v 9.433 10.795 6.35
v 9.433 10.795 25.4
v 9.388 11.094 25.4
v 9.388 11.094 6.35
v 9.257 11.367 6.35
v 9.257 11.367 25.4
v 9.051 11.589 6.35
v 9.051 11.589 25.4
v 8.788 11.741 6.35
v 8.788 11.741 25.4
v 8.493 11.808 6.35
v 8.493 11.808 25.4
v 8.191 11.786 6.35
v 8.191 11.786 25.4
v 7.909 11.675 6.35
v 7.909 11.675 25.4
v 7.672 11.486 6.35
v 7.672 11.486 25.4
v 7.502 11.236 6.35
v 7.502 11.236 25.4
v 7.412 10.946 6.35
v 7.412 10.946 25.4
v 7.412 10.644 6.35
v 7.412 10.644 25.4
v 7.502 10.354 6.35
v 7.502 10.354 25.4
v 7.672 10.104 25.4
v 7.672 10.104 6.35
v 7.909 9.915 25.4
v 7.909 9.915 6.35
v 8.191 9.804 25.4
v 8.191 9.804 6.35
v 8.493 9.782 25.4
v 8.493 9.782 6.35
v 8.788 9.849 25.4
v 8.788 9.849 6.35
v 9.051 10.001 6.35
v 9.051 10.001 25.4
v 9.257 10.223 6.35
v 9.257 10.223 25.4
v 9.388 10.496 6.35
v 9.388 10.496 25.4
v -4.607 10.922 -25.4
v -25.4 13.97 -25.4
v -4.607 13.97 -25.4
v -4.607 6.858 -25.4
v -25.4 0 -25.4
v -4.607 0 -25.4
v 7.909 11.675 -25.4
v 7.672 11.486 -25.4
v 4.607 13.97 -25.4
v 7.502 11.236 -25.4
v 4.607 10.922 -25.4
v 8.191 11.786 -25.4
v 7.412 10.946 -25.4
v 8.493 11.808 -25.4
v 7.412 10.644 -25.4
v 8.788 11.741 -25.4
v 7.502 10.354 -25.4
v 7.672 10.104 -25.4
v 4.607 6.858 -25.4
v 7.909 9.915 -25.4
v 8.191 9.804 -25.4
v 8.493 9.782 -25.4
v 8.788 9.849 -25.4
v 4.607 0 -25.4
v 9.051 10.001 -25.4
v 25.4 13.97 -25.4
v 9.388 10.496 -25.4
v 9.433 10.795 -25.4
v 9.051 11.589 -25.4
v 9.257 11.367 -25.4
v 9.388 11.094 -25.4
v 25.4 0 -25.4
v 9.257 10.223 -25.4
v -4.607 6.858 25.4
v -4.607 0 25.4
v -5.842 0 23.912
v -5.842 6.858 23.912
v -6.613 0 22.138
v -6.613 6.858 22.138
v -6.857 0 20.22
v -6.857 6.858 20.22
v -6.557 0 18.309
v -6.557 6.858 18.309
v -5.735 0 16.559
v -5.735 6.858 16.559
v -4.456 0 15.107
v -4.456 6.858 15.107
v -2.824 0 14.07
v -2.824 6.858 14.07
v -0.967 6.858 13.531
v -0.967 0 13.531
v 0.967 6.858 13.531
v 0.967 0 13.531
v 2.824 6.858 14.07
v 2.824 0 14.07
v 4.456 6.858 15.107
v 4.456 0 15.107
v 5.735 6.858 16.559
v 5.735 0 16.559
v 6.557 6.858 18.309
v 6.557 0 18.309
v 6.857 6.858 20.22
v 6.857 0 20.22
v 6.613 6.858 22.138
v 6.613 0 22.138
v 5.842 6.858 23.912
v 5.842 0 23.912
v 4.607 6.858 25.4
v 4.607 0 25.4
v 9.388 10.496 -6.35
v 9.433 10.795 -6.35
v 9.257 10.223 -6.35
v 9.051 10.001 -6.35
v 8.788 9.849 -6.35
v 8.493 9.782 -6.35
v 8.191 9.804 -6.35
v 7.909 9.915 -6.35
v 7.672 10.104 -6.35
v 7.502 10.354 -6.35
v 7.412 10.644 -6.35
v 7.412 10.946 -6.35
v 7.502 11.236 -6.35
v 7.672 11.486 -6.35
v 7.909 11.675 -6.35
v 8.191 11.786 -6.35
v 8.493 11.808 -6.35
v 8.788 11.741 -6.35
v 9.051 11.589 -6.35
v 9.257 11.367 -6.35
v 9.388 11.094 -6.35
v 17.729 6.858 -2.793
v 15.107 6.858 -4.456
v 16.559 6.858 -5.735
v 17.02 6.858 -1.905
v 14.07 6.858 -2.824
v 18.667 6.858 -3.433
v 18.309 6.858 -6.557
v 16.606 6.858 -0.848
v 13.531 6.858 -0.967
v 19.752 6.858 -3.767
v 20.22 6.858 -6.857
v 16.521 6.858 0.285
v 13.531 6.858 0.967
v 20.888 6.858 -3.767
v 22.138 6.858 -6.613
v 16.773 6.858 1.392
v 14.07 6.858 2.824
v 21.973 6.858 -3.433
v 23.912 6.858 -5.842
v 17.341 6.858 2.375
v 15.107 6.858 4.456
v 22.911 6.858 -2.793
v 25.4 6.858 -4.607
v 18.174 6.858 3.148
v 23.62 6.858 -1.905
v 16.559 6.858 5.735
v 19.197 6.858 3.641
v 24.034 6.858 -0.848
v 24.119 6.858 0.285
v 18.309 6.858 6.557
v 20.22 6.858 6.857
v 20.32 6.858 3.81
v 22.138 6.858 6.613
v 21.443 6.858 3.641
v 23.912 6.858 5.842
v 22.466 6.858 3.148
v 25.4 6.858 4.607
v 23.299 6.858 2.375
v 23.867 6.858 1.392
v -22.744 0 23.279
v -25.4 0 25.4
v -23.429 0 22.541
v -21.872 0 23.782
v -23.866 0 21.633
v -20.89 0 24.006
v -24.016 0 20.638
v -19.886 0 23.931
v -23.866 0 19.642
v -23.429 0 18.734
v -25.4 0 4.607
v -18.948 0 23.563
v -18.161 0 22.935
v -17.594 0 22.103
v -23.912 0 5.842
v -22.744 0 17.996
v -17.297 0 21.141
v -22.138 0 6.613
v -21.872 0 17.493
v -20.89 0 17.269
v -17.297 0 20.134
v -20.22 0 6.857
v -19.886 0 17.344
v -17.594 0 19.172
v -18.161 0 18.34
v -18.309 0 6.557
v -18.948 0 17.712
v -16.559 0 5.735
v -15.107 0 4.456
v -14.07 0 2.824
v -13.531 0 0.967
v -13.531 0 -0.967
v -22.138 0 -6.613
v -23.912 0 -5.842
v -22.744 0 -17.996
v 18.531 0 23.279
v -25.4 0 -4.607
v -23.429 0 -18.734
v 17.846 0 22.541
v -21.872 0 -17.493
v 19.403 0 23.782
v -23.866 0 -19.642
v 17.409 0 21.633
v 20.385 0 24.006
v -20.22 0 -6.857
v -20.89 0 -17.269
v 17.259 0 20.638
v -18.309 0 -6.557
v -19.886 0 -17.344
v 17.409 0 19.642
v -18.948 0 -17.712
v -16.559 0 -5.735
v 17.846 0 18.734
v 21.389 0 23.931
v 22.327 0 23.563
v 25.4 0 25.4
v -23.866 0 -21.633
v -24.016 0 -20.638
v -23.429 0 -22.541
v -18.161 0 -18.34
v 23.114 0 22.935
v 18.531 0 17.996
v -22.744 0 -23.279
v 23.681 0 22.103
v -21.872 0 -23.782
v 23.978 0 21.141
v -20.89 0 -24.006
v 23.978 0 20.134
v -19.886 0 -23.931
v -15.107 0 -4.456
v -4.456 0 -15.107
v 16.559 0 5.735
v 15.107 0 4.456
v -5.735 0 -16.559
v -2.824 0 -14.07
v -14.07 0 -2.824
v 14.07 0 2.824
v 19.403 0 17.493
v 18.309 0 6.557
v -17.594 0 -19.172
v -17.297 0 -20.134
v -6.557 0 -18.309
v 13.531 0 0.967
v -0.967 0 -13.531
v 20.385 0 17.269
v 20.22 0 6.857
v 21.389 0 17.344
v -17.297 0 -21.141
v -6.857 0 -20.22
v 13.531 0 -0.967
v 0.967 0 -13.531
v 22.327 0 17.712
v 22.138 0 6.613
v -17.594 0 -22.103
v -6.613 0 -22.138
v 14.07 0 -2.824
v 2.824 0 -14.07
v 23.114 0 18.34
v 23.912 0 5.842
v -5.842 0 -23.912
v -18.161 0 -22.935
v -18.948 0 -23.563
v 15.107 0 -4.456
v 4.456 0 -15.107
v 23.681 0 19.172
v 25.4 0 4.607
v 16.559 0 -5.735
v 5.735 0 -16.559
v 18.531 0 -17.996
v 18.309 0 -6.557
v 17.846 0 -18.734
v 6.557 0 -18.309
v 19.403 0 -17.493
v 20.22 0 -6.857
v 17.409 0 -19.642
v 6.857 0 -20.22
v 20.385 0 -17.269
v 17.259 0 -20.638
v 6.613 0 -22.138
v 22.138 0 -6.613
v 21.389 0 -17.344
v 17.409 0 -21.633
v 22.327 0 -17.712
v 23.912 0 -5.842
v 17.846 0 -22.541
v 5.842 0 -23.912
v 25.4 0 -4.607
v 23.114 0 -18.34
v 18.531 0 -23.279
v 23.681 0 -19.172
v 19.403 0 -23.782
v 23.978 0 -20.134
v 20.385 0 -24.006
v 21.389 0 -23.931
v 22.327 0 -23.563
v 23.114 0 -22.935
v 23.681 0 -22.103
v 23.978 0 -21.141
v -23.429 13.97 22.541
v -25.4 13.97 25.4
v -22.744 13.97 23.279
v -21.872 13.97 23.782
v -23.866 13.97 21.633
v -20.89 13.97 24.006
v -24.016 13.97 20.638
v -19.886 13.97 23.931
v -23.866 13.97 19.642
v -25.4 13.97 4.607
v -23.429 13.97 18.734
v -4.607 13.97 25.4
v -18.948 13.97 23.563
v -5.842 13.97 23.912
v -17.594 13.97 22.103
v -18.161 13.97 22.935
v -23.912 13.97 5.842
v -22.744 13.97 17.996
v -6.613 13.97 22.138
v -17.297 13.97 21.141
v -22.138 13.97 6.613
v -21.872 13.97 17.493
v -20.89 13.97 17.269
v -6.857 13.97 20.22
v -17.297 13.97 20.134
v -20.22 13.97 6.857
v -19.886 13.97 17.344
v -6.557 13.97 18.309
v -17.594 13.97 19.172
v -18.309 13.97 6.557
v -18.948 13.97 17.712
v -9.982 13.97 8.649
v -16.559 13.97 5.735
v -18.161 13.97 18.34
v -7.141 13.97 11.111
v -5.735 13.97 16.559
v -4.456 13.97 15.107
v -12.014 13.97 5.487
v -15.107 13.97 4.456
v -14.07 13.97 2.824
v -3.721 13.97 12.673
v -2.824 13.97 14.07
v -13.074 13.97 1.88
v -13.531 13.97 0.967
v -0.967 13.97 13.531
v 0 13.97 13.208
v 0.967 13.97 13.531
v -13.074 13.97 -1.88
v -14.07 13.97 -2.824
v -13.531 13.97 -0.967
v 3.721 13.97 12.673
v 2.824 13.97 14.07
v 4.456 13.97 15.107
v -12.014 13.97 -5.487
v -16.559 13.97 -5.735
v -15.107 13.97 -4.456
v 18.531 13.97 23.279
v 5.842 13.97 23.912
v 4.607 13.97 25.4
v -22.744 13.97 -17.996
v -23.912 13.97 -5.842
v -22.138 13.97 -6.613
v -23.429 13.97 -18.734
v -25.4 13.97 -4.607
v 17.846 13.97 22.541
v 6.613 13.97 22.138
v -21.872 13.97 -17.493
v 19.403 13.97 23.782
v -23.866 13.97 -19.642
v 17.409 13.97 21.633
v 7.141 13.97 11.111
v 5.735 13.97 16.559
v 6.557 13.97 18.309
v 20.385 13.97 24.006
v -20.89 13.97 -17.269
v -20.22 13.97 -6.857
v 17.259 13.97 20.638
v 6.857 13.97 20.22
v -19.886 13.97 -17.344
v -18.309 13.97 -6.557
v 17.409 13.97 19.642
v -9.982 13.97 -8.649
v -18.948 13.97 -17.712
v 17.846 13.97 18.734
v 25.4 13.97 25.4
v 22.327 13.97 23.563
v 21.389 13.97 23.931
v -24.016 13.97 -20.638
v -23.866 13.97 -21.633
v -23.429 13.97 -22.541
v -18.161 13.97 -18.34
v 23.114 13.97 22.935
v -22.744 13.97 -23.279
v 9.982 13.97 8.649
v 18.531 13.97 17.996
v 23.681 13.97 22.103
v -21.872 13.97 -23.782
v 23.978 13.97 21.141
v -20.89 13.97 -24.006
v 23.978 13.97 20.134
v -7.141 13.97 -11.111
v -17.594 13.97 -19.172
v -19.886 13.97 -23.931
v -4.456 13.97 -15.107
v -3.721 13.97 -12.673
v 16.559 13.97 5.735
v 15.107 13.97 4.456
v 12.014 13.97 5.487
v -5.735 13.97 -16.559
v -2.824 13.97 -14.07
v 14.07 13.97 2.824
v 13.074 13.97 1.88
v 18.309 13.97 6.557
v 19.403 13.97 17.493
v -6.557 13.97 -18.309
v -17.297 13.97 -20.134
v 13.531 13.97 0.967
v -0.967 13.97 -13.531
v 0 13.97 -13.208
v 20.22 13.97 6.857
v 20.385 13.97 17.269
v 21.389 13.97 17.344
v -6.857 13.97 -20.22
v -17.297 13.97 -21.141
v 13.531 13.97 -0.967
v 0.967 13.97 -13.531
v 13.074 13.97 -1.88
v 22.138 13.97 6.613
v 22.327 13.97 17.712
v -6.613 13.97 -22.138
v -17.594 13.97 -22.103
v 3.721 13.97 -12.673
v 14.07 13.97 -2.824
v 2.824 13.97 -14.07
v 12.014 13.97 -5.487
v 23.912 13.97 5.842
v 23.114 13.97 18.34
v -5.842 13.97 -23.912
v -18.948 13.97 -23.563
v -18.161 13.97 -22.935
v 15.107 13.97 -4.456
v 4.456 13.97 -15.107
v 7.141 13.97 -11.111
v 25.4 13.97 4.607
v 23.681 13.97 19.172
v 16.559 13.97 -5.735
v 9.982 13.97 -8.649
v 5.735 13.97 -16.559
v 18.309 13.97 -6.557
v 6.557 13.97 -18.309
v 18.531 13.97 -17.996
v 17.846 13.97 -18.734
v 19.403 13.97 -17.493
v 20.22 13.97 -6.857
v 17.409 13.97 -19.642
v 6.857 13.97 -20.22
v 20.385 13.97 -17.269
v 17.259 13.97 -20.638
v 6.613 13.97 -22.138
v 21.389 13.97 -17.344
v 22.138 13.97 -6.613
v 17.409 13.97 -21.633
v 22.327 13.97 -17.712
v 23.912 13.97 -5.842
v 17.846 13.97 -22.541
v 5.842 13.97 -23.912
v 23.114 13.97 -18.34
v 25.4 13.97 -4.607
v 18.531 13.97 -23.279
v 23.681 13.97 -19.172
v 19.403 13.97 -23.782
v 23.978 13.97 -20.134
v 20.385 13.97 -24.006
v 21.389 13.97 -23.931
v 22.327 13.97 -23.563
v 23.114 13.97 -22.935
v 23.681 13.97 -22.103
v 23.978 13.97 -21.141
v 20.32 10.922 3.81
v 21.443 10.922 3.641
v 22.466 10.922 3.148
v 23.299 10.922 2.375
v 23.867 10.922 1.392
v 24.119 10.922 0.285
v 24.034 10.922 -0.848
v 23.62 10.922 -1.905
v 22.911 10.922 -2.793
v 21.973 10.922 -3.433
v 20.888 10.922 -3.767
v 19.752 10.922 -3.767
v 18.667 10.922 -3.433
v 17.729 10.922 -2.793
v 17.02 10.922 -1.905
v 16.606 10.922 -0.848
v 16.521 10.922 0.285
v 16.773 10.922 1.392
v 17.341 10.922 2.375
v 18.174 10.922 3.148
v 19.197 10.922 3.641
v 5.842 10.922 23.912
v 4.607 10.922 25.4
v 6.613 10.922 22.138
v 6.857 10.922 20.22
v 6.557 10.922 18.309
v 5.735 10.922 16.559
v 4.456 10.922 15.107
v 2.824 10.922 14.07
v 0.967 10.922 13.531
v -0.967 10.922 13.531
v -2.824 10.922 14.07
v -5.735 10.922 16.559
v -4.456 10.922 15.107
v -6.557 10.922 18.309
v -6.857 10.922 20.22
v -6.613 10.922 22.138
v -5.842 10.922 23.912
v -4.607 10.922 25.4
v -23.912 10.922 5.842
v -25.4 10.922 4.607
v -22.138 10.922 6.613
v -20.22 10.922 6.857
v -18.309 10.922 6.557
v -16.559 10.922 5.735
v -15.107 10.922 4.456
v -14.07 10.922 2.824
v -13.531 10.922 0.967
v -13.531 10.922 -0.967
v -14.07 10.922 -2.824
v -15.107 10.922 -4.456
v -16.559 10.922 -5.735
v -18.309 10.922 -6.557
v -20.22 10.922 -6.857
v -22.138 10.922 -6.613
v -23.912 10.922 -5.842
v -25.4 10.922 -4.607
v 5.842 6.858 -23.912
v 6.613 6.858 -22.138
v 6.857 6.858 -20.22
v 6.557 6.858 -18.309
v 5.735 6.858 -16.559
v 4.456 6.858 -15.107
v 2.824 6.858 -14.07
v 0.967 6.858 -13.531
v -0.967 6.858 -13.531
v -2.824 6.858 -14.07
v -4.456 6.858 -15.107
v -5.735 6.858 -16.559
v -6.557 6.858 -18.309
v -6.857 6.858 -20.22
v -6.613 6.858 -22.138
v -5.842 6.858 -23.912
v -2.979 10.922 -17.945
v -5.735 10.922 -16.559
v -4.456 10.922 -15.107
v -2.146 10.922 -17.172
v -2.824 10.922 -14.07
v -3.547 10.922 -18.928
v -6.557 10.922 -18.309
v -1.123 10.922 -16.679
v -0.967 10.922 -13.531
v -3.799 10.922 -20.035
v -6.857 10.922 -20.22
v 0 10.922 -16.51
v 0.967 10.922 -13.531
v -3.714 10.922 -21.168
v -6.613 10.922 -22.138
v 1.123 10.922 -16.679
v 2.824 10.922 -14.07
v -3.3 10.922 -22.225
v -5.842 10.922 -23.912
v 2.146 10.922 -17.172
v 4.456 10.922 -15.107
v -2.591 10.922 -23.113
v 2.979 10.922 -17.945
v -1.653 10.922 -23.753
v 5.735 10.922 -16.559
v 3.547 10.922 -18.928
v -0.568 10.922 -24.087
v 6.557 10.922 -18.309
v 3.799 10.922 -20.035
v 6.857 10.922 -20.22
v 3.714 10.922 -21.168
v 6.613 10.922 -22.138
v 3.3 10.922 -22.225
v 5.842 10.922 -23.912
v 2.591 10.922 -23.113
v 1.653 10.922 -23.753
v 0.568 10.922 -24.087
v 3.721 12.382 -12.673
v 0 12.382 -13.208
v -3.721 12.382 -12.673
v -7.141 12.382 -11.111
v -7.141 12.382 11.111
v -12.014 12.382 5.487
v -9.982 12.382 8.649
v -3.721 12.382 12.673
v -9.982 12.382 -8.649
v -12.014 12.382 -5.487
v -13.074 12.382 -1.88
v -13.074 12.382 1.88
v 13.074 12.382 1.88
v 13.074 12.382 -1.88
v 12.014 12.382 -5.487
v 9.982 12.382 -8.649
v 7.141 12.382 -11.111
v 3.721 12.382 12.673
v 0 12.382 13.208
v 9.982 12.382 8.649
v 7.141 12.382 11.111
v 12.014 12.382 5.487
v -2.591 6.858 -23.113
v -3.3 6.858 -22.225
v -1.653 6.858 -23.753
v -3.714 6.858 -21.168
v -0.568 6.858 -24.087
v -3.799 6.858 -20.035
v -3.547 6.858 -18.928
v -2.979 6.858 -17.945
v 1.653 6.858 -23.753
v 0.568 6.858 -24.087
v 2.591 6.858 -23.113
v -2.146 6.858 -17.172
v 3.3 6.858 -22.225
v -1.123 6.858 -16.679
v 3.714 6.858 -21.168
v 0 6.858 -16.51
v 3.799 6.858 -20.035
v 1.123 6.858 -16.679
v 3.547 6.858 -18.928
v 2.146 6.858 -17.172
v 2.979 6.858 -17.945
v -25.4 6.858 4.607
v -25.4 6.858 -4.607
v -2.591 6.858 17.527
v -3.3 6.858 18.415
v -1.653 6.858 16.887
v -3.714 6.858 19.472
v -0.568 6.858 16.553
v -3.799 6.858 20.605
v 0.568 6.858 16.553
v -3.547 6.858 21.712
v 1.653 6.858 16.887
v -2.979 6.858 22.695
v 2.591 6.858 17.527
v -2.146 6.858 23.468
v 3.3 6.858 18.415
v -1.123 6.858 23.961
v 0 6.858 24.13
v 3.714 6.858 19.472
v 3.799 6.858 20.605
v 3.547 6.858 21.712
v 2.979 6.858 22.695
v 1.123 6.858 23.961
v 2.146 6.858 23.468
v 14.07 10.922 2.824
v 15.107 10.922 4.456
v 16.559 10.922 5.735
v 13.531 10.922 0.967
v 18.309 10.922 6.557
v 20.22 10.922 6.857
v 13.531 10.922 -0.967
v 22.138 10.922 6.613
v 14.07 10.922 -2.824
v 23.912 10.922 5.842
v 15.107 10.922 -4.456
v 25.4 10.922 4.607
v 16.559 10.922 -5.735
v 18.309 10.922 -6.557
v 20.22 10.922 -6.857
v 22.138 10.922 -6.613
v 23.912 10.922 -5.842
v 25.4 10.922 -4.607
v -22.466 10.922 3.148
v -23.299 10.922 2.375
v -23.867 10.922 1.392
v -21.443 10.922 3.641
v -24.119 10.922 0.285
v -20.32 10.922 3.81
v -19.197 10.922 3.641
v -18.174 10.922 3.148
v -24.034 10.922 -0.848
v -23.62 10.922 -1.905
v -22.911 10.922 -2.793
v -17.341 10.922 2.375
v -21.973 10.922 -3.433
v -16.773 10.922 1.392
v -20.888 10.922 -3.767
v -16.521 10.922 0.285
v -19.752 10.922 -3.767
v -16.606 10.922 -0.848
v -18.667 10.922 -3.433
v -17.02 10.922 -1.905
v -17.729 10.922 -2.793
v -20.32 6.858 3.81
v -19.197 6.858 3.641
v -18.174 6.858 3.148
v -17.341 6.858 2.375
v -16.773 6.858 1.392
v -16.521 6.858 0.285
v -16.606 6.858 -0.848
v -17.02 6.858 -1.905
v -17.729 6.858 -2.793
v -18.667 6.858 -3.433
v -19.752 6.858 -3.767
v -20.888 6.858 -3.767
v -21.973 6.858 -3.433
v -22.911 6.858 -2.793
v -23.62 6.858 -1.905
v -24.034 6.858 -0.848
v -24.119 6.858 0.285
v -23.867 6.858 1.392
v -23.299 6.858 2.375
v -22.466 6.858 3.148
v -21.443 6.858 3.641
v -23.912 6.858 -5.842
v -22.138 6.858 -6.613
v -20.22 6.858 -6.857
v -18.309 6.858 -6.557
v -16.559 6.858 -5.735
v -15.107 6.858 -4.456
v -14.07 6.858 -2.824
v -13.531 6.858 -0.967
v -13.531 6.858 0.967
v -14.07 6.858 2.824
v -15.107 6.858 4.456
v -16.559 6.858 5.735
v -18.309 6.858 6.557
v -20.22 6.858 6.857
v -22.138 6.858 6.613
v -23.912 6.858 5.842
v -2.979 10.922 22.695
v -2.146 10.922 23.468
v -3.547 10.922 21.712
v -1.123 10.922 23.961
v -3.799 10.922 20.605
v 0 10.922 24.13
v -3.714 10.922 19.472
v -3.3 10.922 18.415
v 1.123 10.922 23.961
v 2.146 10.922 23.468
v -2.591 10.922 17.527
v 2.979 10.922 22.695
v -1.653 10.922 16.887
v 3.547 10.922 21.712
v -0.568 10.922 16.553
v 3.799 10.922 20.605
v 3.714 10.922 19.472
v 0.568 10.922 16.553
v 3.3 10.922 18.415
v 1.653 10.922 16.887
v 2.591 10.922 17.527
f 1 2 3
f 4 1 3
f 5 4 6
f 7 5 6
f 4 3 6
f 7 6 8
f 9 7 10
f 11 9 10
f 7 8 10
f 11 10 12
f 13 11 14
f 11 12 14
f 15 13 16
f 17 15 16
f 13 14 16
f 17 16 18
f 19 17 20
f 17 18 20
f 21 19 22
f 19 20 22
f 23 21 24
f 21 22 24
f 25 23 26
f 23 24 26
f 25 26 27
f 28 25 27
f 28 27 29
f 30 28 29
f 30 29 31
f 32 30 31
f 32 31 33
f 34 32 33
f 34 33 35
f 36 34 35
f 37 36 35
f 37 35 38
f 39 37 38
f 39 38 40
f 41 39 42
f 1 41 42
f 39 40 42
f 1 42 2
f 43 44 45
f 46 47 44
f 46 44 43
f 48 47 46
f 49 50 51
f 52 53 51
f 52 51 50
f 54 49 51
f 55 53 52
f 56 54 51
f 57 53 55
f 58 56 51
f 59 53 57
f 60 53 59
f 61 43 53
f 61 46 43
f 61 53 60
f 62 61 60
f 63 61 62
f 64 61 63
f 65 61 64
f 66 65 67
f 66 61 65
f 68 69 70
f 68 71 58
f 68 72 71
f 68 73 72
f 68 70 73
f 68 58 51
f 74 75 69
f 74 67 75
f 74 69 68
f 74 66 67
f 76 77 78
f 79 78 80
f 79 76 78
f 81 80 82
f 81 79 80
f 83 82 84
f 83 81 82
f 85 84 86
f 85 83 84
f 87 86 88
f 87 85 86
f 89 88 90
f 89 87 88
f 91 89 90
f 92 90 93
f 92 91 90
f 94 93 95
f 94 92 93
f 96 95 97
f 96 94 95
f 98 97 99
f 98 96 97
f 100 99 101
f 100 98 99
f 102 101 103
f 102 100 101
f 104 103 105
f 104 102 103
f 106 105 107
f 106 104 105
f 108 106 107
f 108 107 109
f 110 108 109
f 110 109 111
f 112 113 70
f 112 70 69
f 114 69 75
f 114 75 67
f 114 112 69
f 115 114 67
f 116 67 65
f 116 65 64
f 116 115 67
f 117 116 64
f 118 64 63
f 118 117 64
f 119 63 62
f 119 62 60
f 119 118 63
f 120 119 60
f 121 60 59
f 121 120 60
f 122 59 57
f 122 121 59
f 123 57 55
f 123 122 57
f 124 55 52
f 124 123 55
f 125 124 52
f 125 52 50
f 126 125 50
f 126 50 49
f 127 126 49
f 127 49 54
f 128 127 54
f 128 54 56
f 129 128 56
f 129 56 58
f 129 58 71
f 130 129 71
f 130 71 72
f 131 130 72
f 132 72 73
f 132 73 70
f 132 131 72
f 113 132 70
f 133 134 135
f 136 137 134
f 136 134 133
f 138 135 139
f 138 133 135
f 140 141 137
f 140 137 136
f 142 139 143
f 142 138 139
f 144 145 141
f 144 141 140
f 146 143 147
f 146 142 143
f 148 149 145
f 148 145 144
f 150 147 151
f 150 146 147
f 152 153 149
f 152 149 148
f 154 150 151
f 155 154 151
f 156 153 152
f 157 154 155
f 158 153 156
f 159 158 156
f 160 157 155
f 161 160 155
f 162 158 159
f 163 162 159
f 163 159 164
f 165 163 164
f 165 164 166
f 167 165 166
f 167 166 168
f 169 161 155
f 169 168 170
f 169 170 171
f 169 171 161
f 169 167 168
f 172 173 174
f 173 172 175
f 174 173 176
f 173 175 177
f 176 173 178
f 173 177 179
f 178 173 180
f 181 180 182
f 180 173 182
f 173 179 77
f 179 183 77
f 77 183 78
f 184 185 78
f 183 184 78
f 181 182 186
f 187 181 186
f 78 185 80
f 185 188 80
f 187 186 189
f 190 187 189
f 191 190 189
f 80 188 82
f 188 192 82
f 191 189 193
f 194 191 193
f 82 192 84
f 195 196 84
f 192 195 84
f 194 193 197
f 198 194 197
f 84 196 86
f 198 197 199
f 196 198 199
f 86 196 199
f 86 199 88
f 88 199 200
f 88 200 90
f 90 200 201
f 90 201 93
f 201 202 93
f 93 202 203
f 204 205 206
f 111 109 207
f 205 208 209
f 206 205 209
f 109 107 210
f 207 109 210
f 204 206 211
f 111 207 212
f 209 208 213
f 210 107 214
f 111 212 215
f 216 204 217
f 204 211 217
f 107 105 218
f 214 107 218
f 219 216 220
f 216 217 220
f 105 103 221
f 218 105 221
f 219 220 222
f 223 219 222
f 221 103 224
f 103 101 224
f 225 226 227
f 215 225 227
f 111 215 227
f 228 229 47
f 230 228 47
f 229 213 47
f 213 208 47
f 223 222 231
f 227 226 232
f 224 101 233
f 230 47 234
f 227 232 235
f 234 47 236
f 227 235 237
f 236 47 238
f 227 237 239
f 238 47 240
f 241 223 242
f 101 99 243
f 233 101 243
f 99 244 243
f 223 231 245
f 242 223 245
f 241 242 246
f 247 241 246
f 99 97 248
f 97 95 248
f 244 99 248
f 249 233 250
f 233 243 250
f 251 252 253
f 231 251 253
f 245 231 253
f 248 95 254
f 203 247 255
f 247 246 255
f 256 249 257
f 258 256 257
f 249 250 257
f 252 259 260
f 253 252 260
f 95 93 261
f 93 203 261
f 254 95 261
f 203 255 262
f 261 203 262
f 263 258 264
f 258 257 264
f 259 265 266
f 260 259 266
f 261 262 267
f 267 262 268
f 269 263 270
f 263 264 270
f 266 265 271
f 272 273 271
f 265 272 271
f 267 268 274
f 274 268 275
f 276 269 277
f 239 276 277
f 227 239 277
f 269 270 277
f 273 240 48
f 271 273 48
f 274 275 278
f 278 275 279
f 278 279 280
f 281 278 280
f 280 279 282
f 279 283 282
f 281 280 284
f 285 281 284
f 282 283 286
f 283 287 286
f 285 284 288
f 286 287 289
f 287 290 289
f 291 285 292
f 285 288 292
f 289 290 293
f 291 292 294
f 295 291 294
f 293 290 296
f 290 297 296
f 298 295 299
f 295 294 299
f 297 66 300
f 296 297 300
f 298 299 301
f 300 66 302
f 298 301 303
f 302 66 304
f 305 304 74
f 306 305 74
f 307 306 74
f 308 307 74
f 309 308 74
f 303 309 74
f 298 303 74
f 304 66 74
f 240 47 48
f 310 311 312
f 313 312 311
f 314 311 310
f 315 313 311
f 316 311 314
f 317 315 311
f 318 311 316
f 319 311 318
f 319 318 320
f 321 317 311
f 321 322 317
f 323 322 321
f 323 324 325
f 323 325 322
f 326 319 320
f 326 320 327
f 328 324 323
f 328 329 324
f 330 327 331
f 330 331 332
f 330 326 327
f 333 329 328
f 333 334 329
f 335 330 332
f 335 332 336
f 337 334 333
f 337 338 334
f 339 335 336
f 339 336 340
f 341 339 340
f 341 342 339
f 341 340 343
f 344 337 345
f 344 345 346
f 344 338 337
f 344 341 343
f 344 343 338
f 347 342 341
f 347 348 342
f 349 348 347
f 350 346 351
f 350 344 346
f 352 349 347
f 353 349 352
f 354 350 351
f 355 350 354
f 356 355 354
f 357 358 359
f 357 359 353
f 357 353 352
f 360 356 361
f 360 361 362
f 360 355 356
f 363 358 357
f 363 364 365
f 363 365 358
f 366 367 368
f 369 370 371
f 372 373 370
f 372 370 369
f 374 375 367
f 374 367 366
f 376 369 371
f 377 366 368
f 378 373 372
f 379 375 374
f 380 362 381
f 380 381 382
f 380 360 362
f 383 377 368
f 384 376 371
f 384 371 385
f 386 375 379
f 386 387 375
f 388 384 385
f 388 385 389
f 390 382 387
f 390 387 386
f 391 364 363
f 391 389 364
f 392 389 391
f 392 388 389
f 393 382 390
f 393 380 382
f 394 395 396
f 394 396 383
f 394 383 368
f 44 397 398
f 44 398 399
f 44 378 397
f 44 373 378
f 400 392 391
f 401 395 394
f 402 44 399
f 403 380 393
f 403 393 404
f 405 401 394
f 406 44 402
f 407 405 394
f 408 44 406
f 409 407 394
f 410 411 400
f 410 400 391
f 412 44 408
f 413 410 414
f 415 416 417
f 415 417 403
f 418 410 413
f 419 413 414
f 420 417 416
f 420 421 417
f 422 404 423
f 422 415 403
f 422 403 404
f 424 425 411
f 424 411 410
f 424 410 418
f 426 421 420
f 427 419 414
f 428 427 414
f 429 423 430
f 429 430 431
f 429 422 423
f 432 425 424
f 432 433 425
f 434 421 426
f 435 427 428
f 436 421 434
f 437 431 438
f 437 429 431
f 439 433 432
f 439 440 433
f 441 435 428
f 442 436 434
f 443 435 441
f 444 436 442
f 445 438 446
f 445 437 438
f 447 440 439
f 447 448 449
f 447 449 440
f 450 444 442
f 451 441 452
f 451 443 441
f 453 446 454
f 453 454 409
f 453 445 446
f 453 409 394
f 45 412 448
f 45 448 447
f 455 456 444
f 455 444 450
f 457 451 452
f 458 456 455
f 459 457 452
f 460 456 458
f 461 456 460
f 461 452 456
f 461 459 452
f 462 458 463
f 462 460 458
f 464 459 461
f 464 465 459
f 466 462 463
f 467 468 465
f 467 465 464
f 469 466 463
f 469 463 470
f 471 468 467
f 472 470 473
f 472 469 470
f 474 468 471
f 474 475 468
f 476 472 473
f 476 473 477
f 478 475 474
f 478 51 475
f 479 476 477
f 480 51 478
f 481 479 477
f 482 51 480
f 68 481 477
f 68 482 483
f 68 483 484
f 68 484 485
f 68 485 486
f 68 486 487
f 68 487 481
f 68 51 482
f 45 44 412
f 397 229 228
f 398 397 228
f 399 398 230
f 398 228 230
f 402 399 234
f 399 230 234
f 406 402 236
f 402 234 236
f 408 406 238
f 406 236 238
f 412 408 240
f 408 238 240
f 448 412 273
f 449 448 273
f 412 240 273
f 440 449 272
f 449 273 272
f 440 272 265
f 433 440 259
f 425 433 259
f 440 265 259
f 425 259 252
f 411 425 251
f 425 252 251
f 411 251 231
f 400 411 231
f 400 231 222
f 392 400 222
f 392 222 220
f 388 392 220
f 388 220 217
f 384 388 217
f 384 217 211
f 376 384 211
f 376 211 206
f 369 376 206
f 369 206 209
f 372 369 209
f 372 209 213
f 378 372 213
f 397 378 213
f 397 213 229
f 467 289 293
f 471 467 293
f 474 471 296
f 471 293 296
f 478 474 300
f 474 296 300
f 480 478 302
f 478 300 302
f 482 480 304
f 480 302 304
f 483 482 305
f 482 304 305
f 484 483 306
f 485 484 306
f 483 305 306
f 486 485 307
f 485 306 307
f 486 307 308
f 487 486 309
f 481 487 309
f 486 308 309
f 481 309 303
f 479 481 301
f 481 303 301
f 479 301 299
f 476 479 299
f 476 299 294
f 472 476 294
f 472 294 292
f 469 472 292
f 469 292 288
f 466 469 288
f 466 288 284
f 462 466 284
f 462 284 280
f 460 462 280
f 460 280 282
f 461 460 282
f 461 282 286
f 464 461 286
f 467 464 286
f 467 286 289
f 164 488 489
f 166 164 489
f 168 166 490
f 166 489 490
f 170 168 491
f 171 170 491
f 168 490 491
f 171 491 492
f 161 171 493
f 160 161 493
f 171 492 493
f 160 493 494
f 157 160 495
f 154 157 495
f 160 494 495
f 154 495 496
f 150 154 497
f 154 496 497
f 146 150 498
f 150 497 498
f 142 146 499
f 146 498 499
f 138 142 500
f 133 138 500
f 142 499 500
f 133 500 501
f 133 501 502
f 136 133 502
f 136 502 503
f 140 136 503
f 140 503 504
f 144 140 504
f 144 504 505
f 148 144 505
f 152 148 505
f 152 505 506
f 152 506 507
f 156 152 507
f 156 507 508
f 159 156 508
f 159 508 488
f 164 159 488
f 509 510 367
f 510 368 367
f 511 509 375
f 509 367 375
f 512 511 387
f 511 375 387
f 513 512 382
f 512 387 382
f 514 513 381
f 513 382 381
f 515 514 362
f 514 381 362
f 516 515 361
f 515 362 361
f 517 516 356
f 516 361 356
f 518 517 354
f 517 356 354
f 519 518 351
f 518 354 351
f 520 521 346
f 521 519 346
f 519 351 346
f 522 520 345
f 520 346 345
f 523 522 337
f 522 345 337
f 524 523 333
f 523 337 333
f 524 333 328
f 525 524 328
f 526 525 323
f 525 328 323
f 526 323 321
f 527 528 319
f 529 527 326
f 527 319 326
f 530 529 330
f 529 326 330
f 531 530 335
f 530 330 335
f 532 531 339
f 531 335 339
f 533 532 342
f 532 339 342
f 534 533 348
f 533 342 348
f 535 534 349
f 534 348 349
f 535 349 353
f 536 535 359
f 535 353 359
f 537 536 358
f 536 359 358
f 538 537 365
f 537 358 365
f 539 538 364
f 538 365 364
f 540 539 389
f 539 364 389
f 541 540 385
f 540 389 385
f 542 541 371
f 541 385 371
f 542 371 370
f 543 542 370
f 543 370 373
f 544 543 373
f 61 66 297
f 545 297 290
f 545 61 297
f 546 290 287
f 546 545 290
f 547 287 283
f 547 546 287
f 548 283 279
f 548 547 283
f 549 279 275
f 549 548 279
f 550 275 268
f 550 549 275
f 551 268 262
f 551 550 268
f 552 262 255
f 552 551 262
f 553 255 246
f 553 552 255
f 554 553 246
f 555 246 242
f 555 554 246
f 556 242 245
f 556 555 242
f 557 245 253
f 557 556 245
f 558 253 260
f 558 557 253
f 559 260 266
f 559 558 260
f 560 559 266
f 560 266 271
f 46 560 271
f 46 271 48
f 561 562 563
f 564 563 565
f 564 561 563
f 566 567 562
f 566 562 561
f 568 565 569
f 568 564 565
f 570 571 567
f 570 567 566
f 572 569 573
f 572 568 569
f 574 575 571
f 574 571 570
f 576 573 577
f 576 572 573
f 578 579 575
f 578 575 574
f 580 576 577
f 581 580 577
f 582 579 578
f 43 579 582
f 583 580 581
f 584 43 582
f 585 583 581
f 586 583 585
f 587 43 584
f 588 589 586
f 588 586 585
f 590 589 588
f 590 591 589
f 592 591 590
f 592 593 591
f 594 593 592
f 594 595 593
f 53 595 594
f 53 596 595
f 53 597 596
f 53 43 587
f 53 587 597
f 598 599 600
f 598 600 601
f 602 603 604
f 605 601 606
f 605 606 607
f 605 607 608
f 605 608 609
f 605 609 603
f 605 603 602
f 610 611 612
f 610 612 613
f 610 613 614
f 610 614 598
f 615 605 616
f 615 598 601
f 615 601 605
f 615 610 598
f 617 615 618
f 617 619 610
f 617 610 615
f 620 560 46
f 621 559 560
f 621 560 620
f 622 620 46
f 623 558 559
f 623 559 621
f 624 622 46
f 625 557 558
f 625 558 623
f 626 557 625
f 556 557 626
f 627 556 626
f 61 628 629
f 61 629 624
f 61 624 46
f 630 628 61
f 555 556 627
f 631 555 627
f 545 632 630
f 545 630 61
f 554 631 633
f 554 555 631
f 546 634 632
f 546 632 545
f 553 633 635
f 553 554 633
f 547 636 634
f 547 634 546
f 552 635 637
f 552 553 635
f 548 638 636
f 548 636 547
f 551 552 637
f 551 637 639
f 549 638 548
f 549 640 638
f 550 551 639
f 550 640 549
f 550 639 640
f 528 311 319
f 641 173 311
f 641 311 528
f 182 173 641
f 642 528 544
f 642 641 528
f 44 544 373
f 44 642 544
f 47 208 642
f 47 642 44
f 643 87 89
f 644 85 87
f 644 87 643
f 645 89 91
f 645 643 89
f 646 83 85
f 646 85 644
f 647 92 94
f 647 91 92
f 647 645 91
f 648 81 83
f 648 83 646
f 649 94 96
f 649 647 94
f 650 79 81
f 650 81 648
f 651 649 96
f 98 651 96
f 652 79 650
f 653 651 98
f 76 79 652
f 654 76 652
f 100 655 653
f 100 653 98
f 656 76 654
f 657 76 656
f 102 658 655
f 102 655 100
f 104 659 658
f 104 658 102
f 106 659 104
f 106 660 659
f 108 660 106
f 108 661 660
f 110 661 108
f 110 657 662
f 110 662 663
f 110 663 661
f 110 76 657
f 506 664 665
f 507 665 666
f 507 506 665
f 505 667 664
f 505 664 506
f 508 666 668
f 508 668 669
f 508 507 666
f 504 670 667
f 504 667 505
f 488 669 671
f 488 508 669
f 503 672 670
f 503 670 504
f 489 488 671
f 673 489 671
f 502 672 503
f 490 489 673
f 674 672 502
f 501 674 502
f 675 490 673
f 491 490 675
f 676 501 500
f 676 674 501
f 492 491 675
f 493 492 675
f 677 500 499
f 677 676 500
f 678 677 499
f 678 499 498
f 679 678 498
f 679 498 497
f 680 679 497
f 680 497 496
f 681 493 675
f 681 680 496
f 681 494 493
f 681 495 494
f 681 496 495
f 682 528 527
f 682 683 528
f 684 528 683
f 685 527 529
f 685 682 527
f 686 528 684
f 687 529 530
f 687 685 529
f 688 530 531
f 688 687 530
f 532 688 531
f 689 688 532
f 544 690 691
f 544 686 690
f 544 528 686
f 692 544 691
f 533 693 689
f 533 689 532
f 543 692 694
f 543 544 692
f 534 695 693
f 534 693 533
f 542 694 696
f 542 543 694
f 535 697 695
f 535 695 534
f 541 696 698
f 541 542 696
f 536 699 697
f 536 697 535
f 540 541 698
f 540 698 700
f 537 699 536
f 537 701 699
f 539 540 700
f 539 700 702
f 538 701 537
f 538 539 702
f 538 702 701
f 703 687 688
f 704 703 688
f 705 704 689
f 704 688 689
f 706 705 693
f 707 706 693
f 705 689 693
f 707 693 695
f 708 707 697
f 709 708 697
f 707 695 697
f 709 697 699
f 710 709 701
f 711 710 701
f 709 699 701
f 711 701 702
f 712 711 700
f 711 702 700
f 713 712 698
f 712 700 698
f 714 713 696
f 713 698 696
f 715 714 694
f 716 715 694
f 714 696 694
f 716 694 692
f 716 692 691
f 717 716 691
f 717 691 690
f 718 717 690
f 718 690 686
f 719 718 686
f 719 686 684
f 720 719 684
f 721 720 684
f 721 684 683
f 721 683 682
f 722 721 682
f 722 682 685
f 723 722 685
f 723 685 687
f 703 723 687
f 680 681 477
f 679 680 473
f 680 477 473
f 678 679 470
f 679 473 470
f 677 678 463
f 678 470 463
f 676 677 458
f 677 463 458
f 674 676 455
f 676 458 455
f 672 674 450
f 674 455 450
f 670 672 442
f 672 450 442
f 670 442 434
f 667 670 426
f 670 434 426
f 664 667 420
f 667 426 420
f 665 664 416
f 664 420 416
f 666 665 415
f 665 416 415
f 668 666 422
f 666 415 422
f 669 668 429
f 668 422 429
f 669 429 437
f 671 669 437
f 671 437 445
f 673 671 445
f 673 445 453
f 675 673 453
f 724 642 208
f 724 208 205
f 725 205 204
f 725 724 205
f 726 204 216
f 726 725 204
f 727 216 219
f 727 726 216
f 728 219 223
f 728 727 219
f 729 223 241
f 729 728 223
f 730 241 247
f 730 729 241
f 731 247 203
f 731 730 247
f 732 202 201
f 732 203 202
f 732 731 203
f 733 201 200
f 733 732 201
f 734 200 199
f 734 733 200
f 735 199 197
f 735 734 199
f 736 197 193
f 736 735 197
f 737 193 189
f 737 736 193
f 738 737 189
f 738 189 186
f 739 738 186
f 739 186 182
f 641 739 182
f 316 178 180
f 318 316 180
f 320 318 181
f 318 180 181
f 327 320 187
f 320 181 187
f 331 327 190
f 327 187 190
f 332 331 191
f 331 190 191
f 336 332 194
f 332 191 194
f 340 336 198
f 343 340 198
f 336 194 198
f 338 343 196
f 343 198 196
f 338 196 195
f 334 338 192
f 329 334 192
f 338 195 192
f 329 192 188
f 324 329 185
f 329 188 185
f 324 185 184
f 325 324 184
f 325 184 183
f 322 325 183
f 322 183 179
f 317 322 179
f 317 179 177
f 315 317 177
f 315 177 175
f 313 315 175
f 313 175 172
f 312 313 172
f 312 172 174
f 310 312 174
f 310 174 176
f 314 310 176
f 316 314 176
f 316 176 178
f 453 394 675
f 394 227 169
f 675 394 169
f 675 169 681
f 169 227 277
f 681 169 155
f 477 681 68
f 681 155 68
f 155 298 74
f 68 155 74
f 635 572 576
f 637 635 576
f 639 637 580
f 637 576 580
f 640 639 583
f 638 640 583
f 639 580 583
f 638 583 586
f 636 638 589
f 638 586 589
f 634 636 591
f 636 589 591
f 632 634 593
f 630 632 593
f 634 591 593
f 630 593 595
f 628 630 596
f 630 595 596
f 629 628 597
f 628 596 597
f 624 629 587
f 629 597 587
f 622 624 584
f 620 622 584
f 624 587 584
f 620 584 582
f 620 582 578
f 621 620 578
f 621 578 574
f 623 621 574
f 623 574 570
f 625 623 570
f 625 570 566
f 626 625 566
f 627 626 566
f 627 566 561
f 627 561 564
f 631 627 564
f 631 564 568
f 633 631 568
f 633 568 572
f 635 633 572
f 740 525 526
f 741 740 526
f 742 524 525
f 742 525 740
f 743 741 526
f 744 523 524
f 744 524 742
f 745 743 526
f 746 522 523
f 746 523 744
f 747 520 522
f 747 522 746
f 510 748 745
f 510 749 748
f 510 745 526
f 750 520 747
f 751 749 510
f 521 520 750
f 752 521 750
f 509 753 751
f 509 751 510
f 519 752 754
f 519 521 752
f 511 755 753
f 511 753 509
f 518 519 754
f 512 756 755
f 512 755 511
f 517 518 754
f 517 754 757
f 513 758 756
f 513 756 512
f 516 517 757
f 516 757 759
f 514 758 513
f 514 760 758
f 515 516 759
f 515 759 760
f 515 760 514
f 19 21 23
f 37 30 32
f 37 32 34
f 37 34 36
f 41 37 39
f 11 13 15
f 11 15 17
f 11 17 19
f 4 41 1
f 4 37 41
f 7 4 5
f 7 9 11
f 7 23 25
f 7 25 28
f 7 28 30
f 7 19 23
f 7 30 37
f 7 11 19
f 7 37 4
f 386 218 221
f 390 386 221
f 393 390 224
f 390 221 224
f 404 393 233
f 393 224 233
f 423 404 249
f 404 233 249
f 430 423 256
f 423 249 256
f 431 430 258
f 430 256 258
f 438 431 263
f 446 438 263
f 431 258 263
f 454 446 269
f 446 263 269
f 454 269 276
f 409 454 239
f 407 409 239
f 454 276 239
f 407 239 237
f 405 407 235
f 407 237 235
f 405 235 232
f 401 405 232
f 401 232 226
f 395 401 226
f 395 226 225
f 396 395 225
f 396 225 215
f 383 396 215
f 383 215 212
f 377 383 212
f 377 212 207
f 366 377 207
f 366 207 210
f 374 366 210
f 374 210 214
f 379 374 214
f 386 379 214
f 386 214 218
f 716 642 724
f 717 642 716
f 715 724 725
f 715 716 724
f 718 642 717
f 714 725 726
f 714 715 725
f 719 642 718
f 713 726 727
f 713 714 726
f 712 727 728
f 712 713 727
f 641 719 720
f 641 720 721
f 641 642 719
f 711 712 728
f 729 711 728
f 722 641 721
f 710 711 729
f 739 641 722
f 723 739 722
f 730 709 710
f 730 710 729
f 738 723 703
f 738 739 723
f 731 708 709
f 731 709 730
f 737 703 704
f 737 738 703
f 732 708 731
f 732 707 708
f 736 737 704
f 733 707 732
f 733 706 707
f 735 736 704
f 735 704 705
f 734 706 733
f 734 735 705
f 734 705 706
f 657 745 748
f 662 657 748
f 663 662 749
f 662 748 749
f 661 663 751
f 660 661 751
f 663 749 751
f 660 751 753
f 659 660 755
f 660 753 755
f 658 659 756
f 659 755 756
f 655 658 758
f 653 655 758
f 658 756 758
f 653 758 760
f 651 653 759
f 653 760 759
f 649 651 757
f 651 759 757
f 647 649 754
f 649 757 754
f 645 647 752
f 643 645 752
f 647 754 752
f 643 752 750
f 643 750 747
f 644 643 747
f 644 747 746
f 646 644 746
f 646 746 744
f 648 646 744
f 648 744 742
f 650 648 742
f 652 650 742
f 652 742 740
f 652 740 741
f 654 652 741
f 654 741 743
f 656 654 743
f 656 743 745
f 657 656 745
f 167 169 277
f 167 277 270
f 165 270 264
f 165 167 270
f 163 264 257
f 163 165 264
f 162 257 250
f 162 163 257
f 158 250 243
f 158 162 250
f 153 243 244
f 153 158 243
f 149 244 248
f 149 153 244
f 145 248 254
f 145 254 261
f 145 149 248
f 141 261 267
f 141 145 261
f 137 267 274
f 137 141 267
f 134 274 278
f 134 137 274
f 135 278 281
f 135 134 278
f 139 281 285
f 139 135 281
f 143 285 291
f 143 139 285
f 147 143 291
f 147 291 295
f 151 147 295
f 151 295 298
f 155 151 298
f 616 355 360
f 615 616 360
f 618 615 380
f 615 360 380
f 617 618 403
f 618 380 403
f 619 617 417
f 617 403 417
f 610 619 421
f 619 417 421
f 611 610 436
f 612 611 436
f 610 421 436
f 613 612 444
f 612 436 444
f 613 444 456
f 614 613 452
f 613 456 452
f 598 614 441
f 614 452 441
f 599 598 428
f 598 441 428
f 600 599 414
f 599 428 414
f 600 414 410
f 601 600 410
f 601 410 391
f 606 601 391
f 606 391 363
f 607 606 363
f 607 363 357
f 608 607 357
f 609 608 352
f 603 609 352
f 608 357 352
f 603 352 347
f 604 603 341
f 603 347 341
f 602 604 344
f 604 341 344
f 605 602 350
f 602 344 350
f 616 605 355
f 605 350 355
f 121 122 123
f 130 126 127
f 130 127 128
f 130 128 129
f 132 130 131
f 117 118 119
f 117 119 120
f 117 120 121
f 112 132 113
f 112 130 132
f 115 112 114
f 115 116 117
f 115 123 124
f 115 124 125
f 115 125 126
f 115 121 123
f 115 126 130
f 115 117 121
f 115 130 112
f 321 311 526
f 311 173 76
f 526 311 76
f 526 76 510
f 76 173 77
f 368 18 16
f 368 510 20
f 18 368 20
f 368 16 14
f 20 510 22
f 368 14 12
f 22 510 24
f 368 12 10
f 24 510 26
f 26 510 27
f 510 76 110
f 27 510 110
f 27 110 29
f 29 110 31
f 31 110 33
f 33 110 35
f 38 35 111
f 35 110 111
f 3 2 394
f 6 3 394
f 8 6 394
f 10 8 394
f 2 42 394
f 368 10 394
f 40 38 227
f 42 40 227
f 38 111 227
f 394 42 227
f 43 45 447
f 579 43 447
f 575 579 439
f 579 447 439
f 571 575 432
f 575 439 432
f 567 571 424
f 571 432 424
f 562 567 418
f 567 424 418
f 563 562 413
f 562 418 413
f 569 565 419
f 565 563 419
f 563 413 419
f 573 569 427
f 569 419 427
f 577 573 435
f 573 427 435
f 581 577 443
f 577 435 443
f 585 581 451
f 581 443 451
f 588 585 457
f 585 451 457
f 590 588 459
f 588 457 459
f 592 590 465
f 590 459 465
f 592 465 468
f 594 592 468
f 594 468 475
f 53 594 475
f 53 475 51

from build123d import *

# Parameters (mm, degrees)
SKETCH1_W               = 50.8
SKETCH1_H               = 50.8
BOSS_EXTRUDE1_DEPTH     = 13.97
F_1_4_CLEARANCE_HOLE1_D = 6.7564
SKETCH5_R               = 13.208
CUT_EXTRUDE1_DEPTH      = 1.5875
SKETCH6_R               = 3.81
CUT_EXTRUDE2_DEPTH      = 39.5419369
SKETCH10_R              = 6.858
CUT_EXTRUDE3_DEPTH      = 3.048
CUT_EXTRUDE4_START      = -6.858
SKETCH11_R              = 6.858
CUT_EXTRUDE4_DEPTH      = 6.858
SKETCH12_R              = 1.016
CUT_EXTRUDE5_DEPTH      = 19.05
CUT_EXTRUDE6_START      = -19.05
SKETCH13_R              = 1.016
CUT_EXTRUDE6_DEPTH      = 19.05


with BuildPart() as part:
    # Sketch1 → Boss-Extrude1 (new body)
    with BuildSketch(Plane(origin=(0, 0, 0), x_dir=(1, 0, 0), z_dir=(0, 1, 0))):
        Rectangle(SKETCH1_W, SKETCH1_H)
    extrude(amount=BOSS_EXTRUDE1_DEPTH)

    # 1/4 Clearance Hole1 (through all)
    with Locations(Plane(origin=(0, 13.97, 0), x_dir=(1, 0, 0), z_dir=(0, 1, 0))):
        with Locations((-20.6375, -20.6375), (-20.6375, 20.6375), (20.6375, 20.6375), (20.6375, -20.6375)):
            Hole(F_1_4_CLEARANCE_HOLE1_D / 2)

    # Sketch5 → Cut-Extrude1 (cut)
    with BuildSketch(Plane(origin=(0, 13.97, 0), x_dir=(1, 0, 0), z_dir=(0, 1, 0))):
        with Locations(Location((0, 0, 0), (0, 0, 270))):
            Circle(SKETCH5_R)
    extrude(amount=-CUT_EXTRUDE1_DEPTH, mode=Mode.SUBTRACT)

    # Sketch6 → Cut-Extrude2 (cut, through all)
    with BuildSketch(Plane(origin=(0, 13.97, 0), x_dir=(1, 0, 0), z_dir=(0, 1, 0))):
        with Locations(Location((0, 20.32, 0), (0, 0, 270))):
            Circle(SKETCH6_R)
        with Locations(Location((20.32, 0, 0), (0, 0, 270))):
            Circle(SKETCH6_R)
        with Locations(Location((0, -20.32, 0), (0, 0, 270))):
            Circle(SKETCH6_R)
        with Locations(Location((-20.32, 0, 0), (0, 0, 270))):
            Circle(SKETCH6_R)
    extrude(amount=-CUT_EXTRUDE2_DEPTH, mode=Mode.SUBTRACT)

    # Sketch10 → Cut-Extrude3 (cut)
    with BuildSketch(Plane(origin=(0, 13.97, 0), x_dir=(1, 0, 0), z_dir=(0, 1, 0))):
        with Locations((-20.32, 0)):
            Circle(SKETCH10_R)
        with Locations((0, 20.32)):
            Circle(SKETCH10_R)
        with Locations((20.32, 0)):
            Circle(SKETCH10_R)
        with Locations((0, -20.32)):
            Circle(SKETCH10_R)
    extrude(amount=-CUT_EXTRUDE3_DEPTH, mode=Mode.SUBTRACT)

    # Sketch11 → Cut-Extrude4 (cut)
    with BuildSketch(Plane.XZ.offset(CUT_EXTRUDE4_START)):
        with Locations((-20.32, 0)):
            Circle(SKETCH11_R)
        with Locations((0, 20.32)):
            Circle(SKETCH11_R)
        with Locations((20.32, 0)):
            Circle(SKETCH11_R)
        with Locations((0, -20.32)):
            Circle(SKETCH11_R)
    extrude(amount=CUT_EXTRUDE4_DEPTH, mode=Mode.SUBTRACT)

    # Sketch12 → Cut-Extrude5 (cut)
    with BuildSketch(Plane.XY.offset(25.4)):
        with Locations((8.417142715, 10.795)):
            Circle(SKETCH12_R)
    extrude(amount=-CUT_EXTRUDE5_DEPTH, mode=Mode.SUBTRACT)

    # Sketch13 → Cut-Extrude6 (cut)
    with BuildSketch(Plane(origin=(0, 0, -25.4), x_dir=(-1, 0, 0), z_dir=(0, 0, -1)).offset(CUT_EXTRUDE6_START)):
        with Locations(Location((-8.417142715, 10.795, 0), (0, 0, 180))):
            Circle(SKETCH13_R)
    extrude(amount=CUT_EXTRUDE6_DEPTH, mode=Mode.SUBTRACT)


solid = part.part
